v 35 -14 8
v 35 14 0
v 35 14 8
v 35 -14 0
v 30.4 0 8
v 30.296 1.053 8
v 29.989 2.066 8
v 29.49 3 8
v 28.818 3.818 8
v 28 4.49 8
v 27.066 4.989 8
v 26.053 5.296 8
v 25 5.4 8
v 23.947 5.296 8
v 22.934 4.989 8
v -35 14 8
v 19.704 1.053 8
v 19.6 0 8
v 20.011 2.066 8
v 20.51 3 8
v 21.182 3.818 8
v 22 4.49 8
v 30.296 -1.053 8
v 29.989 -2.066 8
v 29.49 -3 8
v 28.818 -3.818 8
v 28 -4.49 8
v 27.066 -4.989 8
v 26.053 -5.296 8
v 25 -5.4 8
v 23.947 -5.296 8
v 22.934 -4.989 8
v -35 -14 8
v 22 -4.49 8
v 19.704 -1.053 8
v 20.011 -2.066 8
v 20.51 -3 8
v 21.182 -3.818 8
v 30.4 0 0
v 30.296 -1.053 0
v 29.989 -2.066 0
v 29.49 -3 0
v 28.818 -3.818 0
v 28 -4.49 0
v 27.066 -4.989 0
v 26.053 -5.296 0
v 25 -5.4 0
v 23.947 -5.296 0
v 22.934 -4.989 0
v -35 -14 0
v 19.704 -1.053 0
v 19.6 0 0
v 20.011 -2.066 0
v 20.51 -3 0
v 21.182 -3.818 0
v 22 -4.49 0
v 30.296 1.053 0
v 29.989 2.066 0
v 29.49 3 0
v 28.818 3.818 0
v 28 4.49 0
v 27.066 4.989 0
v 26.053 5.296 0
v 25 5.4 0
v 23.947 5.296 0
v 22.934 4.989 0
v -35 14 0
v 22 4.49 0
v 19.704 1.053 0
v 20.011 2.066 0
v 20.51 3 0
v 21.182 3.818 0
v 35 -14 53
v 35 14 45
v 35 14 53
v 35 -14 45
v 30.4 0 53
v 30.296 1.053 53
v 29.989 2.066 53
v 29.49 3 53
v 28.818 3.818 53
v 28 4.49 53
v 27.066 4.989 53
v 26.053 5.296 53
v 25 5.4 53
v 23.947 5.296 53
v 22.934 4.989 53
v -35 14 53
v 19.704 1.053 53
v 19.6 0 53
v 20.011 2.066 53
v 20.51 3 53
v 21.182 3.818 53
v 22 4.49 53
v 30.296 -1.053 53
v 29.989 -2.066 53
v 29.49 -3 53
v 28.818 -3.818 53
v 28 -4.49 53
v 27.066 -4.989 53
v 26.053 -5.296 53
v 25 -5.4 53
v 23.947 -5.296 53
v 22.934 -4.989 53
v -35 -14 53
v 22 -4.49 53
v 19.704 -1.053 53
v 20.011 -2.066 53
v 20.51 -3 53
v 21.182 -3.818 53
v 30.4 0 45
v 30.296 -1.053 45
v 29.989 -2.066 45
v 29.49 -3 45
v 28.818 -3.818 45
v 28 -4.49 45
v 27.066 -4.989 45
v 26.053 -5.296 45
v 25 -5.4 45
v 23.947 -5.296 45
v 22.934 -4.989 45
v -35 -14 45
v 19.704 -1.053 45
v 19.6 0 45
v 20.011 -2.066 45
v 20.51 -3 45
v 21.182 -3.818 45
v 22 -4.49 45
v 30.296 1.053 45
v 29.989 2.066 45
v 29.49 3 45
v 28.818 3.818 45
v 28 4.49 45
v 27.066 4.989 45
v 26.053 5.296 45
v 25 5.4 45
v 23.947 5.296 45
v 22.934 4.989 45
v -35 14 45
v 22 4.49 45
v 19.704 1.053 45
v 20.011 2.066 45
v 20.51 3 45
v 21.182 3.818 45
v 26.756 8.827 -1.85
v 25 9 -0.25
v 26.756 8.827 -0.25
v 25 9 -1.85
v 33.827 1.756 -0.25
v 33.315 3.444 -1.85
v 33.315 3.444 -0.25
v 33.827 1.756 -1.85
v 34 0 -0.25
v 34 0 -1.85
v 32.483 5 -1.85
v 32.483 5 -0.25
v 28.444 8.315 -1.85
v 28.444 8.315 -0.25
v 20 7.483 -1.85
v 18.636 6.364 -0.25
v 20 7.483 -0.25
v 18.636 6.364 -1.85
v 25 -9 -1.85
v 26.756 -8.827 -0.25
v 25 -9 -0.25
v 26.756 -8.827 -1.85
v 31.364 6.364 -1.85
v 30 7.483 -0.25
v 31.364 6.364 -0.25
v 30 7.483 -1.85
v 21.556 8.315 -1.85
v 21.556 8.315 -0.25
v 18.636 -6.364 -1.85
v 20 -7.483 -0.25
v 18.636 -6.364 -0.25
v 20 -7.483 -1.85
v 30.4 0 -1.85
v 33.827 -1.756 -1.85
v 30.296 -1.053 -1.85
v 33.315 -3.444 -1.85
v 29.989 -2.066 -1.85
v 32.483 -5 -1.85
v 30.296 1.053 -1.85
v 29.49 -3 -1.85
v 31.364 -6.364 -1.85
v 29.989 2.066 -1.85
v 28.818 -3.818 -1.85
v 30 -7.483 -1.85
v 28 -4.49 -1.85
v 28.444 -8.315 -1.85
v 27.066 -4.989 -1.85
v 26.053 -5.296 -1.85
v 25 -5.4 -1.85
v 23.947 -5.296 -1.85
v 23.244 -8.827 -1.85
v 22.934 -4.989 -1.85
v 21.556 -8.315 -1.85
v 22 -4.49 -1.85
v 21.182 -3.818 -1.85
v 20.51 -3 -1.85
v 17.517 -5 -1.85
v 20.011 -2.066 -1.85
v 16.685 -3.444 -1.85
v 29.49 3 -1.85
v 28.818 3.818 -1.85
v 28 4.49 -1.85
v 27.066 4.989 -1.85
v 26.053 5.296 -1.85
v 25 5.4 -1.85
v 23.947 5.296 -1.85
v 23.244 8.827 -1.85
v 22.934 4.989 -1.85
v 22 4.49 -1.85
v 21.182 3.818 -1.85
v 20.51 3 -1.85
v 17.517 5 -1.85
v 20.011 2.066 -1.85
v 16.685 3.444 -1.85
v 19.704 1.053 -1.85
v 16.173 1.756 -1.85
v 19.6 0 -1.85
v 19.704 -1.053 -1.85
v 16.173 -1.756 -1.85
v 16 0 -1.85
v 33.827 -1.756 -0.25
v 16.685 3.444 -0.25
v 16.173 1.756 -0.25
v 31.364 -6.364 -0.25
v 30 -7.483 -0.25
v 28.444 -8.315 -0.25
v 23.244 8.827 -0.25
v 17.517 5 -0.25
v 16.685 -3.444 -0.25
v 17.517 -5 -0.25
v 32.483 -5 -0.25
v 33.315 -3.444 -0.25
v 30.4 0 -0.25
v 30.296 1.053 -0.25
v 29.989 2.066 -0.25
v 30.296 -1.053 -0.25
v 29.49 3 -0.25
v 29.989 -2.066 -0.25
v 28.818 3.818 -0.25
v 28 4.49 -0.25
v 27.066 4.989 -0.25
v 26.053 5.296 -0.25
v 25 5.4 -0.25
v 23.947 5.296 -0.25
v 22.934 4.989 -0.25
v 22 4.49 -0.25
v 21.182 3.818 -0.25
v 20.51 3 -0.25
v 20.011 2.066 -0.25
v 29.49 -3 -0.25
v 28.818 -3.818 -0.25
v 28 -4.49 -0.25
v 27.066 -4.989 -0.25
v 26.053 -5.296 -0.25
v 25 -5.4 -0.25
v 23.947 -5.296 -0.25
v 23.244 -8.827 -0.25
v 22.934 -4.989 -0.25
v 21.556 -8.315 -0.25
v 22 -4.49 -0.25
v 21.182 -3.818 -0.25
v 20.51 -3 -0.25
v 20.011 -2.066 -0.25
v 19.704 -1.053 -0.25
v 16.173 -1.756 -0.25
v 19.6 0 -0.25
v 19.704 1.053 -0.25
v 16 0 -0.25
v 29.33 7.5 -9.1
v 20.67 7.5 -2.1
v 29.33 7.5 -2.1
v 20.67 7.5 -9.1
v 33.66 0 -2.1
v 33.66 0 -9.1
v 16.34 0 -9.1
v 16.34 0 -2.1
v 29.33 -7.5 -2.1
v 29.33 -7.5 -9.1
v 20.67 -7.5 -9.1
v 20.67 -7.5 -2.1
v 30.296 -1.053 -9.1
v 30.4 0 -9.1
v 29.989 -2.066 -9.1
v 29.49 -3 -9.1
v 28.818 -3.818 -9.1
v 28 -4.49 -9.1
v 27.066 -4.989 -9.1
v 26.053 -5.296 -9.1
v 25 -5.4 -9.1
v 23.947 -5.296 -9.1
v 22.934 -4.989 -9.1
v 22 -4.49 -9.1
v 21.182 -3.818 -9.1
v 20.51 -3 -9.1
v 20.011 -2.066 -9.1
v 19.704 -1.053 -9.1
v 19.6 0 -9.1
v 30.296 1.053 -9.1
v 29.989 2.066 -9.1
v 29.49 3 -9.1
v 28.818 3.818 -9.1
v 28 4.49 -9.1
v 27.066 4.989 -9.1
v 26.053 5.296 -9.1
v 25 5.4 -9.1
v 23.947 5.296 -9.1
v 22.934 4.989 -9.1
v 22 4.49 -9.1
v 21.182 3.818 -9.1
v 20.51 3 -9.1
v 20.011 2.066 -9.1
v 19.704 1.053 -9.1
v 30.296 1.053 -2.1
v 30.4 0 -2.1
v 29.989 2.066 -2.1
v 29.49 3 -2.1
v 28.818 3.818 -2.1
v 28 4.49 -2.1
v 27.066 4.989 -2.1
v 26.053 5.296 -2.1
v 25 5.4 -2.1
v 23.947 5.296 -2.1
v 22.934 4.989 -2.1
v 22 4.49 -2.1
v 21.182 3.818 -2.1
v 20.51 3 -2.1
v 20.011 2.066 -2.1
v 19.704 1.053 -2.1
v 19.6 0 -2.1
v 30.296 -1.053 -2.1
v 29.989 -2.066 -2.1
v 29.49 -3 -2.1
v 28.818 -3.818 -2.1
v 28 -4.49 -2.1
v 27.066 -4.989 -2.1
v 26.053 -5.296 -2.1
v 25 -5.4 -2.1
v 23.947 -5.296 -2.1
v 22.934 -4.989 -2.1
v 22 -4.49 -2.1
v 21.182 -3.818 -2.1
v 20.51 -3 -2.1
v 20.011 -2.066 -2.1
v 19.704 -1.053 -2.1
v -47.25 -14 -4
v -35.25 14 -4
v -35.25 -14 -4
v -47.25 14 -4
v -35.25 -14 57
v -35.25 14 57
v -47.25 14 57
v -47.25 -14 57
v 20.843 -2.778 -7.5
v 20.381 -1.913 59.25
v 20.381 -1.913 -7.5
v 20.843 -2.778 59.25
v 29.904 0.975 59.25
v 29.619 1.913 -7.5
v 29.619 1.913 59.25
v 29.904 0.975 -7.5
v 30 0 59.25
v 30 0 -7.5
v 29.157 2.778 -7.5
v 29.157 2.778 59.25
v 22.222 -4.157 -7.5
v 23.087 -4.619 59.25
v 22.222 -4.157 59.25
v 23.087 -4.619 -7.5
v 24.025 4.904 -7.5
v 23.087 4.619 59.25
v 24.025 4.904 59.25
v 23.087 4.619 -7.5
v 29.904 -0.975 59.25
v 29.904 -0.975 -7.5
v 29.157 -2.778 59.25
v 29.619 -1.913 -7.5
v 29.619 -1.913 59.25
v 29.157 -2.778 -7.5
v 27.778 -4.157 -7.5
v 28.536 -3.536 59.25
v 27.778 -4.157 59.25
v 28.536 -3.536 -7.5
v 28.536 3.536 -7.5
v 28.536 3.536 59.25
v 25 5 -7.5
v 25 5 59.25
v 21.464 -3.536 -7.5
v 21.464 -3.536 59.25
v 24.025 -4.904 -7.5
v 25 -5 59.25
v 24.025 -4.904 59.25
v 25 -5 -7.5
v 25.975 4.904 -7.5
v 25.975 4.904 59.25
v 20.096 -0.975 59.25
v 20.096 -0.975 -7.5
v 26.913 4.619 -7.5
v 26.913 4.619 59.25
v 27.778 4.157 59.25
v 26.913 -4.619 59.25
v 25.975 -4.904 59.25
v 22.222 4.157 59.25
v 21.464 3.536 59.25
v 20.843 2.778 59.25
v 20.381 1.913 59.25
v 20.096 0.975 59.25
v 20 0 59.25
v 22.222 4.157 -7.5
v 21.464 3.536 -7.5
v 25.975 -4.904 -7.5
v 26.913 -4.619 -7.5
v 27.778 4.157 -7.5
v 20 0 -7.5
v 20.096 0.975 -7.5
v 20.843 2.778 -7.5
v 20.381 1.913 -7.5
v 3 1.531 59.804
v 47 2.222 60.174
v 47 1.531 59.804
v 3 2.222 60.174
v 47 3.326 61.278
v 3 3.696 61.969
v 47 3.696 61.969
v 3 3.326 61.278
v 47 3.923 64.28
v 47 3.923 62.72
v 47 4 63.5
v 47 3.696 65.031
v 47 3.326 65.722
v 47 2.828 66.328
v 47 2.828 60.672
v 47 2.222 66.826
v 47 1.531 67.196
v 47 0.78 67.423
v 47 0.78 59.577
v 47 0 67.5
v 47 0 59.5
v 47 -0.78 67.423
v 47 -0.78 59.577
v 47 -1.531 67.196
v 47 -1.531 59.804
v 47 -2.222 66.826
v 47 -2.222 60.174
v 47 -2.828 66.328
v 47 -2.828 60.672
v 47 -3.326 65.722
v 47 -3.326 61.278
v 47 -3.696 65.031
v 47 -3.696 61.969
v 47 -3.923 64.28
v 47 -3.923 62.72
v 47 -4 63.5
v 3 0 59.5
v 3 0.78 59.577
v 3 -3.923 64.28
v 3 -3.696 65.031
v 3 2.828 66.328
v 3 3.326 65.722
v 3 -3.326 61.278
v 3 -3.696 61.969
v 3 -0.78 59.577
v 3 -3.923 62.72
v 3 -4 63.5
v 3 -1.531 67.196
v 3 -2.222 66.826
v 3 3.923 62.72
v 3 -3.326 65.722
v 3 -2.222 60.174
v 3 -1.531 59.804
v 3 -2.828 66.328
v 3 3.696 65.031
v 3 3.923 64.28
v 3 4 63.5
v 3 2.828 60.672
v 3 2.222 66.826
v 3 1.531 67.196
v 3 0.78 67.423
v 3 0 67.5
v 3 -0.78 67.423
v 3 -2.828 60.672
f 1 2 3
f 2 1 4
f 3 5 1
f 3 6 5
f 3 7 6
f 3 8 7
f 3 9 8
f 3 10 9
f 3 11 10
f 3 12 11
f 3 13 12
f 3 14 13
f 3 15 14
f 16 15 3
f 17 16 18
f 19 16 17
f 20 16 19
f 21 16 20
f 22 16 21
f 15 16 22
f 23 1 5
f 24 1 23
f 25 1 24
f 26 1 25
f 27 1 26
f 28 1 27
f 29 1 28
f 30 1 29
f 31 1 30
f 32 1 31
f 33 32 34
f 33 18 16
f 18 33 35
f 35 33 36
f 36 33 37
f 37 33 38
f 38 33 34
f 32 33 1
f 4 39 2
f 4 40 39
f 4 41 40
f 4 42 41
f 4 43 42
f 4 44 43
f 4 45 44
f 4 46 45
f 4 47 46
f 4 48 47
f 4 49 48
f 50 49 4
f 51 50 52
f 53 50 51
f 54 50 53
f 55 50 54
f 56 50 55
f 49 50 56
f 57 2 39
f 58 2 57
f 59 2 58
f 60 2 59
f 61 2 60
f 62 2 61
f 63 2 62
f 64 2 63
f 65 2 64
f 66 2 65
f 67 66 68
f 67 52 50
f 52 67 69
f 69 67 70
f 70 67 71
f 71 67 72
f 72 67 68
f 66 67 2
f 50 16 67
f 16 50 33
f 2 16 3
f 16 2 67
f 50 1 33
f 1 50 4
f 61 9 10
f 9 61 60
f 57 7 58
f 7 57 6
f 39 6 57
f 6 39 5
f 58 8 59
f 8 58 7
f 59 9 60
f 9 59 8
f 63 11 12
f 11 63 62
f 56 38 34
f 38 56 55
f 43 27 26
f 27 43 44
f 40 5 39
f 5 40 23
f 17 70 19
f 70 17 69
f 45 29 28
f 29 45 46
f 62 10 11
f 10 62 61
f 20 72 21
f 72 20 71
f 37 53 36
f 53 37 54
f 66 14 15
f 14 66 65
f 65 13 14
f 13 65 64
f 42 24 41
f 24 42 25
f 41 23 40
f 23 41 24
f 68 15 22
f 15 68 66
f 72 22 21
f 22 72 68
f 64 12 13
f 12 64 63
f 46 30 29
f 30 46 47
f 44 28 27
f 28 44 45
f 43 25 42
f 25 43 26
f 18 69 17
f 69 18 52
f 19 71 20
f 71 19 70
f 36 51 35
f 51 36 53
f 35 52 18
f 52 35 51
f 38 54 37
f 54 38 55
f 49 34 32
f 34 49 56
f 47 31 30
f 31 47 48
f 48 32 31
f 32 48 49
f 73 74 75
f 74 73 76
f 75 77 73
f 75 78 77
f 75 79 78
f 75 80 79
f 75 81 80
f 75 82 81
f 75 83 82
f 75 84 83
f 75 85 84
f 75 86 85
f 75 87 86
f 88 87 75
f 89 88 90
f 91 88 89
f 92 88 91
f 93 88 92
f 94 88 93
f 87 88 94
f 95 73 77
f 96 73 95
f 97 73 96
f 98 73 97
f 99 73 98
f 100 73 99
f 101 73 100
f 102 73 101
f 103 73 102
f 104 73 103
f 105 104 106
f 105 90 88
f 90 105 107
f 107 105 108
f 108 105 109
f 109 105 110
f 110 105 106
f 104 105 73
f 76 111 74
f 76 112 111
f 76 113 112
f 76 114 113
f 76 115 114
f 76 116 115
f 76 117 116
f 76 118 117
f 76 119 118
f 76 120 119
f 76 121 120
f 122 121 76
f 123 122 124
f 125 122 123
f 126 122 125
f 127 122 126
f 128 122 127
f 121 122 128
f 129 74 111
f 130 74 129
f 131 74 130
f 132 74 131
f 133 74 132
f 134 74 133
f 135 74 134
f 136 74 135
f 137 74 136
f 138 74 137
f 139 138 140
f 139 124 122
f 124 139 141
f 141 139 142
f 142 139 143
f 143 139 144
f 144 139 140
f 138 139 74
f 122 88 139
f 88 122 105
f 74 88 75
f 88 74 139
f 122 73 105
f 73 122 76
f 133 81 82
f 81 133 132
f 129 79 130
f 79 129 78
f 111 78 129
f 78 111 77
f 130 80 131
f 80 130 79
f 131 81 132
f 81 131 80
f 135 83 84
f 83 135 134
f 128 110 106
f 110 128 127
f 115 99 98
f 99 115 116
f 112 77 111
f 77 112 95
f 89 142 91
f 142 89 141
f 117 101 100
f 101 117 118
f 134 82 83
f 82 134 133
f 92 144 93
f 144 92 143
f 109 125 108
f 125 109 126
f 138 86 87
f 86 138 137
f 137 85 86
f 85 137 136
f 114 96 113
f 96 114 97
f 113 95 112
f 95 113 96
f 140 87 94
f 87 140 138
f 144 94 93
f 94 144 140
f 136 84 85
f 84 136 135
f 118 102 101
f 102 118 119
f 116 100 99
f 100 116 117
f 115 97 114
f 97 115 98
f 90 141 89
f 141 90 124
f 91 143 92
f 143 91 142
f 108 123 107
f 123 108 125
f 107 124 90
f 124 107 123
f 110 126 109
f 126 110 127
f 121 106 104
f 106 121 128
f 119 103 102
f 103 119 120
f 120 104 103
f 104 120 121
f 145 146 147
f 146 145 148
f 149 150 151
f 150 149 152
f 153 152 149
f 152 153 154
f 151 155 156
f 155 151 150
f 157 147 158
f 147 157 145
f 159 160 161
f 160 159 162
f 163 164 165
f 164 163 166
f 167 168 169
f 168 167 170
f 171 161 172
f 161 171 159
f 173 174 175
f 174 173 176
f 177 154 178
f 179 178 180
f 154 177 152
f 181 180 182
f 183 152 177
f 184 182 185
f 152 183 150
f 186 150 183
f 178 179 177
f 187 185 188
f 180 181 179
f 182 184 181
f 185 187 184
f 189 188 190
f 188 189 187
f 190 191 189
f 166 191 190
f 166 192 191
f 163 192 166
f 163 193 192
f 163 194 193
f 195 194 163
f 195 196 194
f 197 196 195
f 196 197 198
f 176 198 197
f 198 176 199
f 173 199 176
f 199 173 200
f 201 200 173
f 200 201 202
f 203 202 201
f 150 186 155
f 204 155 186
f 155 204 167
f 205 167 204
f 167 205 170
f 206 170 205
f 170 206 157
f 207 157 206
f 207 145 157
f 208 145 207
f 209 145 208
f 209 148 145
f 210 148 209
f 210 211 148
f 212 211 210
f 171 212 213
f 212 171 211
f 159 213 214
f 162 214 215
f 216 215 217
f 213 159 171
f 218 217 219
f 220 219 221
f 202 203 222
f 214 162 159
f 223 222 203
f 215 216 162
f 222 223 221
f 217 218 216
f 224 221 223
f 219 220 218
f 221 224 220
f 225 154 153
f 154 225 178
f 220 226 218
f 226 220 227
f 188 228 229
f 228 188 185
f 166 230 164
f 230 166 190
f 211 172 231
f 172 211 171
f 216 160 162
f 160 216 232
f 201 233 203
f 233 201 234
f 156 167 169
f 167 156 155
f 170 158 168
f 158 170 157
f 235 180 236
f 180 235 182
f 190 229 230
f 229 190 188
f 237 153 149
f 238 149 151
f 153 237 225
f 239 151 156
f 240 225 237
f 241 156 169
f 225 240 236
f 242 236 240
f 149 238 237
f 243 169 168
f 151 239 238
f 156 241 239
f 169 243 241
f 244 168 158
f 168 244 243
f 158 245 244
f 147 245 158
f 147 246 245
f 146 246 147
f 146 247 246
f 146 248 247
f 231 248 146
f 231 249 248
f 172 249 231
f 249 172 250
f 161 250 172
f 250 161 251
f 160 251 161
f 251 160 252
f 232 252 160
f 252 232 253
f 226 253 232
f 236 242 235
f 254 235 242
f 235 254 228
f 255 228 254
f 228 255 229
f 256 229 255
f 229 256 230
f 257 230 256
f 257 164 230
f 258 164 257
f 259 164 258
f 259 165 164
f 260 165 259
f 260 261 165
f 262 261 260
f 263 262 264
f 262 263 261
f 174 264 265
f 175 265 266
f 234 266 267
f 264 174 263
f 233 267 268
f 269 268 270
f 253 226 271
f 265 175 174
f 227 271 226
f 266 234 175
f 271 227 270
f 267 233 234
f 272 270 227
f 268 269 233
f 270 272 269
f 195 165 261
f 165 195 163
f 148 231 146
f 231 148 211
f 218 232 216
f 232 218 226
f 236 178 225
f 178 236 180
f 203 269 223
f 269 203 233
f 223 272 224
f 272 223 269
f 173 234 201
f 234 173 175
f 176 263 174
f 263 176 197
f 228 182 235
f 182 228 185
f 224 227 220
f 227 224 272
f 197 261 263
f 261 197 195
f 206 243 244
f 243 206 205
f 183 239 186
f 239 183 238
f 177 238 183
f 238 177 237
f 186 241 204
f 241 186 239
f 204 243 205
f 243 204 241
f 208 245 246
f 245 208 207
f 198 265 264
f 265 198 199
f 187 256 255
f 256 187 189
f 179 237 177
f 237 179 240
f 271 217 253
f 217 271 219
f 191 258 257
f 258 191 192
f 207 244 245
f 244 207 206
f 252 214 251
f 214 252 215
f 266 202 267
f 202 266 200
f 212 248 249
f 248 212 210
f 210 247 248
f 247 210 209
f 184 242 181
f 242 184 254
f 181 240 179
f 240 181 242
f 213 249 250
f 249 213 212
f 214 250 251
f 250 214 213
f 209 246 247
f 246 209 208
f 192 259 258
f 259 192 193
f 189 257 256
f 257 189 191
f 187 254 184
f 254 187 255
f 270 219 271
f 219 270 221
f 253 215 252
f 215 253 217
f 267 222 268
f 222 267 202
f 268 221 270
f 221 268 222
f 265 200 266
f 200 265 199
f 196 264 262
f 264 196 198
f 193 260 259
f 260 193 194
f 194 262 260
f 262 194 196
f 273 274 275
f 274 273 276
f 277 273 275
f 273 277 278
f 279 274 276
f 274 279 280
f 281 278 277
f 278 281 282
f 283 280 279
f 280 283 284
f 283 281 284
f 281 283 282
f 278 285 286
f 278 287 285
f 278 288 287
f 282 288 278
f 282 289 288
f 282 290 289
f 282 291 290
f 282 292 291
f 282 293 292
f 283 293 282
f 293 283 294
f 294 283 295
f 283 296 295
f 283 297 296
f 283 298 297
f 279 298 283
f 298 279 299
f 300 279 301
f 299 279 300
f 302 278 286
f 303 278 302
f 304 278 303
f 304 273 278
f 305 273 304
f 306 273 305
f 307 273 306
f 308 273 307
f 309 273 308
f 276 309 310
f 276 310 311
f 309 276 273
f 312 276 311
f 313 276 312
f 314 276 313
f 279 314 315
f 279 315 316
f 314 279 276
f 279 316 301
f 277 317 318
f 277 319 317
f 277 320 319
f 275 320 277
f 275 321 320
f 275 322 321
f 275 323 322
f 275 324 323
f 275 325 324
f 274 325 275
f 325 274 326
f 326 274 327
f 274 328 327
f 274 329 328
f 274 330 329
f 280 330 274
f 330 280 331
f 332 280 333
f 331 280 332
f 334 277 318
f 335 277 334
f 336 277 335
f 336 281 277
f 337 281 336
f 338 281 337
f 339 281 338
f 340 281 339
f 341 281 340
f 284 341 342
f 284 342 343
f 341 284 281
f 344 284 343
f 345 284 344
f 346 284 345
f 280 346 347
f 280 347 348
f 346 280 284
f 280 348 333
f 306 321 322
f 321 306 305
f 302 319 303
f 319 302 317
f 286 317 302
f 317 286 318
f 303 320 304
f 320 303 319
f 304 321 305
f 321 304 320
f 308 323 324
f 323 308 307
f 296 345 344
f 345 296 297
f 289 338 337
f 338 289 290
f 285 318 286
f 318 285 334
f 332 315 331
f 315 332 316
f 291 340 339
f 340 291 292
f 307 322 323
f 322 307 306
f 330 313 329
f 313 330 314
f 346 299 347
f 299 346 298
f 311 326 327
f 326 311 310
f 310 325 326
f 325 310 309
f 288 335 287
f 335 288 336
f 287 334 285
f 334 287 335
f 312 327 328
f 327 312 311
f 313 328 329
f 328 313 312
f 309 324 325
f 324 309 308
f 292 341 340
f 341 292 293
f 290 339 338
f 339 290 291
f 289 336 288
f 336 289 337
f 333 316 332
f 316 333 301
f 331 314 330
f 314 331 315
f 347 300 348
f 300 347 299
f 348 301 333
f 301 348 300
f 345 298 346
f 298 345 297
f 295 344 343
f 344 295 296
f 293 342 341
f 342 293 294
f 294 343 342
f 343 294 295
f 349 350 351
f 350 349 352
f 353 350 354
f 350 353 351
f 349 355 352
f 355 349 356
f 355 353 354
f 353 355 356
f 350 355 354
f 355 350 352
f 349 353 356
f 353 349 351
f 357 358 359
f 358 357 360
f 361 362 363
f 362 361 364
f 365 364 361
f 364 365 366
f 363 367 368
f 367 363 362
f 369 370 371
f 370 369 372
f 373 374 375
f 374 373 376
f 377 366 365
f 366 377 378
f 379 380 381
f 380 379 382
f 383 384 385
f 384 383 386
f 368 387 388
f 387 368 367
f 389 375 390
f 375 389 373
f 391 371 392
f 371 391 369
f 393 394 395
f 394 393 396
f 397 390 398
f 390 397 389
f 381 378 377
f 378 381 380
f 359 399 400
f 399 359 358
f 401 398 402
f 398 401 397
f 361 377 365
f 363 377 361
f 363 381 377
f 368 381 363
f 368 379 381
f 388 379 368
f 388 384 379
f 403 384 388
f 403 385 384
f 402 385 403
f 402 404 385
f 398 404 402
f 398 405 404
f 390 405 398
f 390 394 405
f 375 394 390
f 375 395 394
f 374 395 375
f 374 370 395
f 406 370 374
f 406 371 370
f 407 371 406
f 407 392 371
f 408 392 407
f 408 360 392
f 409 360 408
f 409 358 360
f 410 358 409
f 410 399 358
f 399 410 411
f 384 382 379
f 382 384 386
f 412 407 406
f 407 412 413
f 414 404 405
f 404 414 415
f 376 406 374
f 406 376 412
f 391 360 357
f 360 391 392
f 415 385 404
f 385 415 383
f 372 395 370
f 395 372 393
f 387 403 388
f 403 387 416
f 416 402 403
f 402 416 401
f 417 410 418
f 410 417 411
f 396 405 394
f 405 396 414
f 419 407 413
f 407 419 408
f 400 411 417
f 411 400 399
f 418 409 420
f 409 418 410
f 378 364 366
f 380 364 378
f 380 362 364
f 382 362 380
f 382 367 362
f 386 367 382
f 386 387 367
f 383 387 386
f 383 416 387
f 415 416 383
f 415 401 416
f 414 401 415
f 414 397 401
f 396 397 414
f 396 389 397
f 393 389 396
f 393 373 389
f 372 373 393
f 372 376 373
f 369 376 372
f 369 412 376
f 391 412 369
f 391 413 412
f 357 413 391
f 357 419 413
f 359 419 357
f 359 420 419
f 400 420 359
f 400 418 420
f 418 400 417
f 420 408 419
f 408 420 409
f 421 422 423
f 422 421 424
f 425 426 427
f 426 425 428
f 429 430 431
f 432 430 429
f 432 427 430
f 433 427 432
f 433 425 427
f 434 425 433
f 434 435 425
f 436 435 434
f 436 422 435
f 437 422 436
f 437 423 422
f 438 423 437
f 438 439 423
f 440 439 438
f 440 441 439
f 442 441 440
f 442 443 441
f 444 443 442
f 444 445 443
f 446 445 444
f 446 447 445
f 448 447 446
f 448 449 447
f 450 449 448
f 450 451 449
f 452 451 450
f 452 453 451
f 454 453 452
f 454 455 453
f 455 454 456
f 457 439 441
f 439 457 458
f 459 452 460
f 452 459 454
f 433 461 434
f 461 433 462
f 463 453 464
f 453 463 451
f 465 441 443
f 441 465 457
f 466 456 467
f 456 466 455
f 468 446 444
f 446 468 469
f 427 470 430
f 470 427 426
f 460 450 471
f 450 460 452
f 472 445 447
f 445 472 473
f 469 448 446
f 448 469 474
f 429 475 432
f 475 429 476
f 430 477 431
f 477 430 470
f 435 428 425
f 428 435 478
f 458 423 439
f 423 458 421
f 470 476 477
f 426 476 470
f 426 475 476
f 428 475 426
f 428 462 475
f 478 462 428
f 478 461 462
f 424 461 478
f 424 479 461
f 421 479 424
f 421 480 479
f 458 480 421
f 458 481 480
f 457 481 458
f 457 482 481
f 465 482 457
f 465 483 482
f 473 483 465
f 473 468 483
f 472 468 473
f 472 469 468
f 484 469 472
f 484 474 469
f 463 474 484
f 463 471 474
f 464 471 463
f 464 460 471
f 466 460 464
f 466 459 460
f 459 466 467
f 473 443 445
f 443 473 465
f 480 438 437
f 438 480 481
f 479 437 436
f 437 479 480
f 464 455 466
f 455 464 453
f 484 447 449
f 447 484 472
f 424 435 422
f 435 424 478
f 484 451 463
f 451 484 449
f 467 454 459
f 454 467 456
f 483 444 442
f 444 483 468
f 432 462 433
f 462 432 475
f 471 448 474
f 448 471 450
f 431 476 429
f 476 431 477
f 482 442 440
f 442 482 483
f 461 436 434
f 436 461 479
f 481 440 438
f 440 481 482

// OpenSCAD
$fn = 32;

// ------------------------------------------------------------------------
// C clamp: throat 45 mm, screw d10
// Every part is its own module, assembly() places every instance.
// ------------------------------------------------------------------------

// --- part 1 ---
module clamp_arm() {
  difference() {
    translate([-35, -14, 0]) cube([70, 28, 8]);
    translate([25, 0, -1]) cylinder(h = 10, d = 10.8);
  }
}

// --- part 2 ---
module clamp_spine() {
  difference() {
    translate([-30.5, -14, 0]) cube([61, 28, 12]);
  }
}

// --- part 3 ---
module clamp_screw() {
  translate([0, 0, -33.375]) cylinder(h = 66.75, d = 10);
}

// --- part 4 ---
module clamp_washer() {
  difference() {
      translate([0, 0, 0]) cylinder(h = 1.6, d = 18);
      translate([0, 0, -1]) cylinder(h = 3.6, d = 10.8);
    }
}

// --- part 5 ---
module clamp_nut() {
  difference() {
    linear_extrude(height = 7) polygon(points = [[8.66, 0], [4.33, 7.5], [-4.33, 7.5], [-8.66, 0], [-4.33, -7.5], [4.33, -7.5]]);
    translate([0, 0, -1]) cylinder(h = 9, d = 10.8);
  }
}

// --- part 6 ---
module tommy_bar() {
  translate([0, 0, -22]) cylinder(h = 44, d = 8);
}

// --- assembly ---
module assembly() {
  color([0.80, 0.24, 0.20]) translate([0, 0, 0]) rotate([0, 0, 0]) clamp_arm();
  color([0.20, 0.45, 0.75]) translate([0, 0, 45]) rotate([0, 0, 0]) clamp_arm();
  color([0.25, 0.62, 0.32]) translate([-47.25, 0, 26.5]) rotate([0, 90, 0]) clamp_spine();
  color([0.92, 0.70, 0.18]) translate([25, 0, 25.875]) rotate([0, 0, 0]) clamp_screw();
  color([0.58, 0.35, 0.70]) translate([25, 0, -1.85]) rotate([0, 0, 0]) clamp_washer();
  color([0.16, 0.66, 0.66]) translate([25, 0, -9.1]) rotate([0, 0, 0]) clamp_nut();
  color([0.85, 0.48, 0.18]) translate([25, 0, 63.5]) rotate([0, 90, 0]) tommy_bar();
}

assembly();
